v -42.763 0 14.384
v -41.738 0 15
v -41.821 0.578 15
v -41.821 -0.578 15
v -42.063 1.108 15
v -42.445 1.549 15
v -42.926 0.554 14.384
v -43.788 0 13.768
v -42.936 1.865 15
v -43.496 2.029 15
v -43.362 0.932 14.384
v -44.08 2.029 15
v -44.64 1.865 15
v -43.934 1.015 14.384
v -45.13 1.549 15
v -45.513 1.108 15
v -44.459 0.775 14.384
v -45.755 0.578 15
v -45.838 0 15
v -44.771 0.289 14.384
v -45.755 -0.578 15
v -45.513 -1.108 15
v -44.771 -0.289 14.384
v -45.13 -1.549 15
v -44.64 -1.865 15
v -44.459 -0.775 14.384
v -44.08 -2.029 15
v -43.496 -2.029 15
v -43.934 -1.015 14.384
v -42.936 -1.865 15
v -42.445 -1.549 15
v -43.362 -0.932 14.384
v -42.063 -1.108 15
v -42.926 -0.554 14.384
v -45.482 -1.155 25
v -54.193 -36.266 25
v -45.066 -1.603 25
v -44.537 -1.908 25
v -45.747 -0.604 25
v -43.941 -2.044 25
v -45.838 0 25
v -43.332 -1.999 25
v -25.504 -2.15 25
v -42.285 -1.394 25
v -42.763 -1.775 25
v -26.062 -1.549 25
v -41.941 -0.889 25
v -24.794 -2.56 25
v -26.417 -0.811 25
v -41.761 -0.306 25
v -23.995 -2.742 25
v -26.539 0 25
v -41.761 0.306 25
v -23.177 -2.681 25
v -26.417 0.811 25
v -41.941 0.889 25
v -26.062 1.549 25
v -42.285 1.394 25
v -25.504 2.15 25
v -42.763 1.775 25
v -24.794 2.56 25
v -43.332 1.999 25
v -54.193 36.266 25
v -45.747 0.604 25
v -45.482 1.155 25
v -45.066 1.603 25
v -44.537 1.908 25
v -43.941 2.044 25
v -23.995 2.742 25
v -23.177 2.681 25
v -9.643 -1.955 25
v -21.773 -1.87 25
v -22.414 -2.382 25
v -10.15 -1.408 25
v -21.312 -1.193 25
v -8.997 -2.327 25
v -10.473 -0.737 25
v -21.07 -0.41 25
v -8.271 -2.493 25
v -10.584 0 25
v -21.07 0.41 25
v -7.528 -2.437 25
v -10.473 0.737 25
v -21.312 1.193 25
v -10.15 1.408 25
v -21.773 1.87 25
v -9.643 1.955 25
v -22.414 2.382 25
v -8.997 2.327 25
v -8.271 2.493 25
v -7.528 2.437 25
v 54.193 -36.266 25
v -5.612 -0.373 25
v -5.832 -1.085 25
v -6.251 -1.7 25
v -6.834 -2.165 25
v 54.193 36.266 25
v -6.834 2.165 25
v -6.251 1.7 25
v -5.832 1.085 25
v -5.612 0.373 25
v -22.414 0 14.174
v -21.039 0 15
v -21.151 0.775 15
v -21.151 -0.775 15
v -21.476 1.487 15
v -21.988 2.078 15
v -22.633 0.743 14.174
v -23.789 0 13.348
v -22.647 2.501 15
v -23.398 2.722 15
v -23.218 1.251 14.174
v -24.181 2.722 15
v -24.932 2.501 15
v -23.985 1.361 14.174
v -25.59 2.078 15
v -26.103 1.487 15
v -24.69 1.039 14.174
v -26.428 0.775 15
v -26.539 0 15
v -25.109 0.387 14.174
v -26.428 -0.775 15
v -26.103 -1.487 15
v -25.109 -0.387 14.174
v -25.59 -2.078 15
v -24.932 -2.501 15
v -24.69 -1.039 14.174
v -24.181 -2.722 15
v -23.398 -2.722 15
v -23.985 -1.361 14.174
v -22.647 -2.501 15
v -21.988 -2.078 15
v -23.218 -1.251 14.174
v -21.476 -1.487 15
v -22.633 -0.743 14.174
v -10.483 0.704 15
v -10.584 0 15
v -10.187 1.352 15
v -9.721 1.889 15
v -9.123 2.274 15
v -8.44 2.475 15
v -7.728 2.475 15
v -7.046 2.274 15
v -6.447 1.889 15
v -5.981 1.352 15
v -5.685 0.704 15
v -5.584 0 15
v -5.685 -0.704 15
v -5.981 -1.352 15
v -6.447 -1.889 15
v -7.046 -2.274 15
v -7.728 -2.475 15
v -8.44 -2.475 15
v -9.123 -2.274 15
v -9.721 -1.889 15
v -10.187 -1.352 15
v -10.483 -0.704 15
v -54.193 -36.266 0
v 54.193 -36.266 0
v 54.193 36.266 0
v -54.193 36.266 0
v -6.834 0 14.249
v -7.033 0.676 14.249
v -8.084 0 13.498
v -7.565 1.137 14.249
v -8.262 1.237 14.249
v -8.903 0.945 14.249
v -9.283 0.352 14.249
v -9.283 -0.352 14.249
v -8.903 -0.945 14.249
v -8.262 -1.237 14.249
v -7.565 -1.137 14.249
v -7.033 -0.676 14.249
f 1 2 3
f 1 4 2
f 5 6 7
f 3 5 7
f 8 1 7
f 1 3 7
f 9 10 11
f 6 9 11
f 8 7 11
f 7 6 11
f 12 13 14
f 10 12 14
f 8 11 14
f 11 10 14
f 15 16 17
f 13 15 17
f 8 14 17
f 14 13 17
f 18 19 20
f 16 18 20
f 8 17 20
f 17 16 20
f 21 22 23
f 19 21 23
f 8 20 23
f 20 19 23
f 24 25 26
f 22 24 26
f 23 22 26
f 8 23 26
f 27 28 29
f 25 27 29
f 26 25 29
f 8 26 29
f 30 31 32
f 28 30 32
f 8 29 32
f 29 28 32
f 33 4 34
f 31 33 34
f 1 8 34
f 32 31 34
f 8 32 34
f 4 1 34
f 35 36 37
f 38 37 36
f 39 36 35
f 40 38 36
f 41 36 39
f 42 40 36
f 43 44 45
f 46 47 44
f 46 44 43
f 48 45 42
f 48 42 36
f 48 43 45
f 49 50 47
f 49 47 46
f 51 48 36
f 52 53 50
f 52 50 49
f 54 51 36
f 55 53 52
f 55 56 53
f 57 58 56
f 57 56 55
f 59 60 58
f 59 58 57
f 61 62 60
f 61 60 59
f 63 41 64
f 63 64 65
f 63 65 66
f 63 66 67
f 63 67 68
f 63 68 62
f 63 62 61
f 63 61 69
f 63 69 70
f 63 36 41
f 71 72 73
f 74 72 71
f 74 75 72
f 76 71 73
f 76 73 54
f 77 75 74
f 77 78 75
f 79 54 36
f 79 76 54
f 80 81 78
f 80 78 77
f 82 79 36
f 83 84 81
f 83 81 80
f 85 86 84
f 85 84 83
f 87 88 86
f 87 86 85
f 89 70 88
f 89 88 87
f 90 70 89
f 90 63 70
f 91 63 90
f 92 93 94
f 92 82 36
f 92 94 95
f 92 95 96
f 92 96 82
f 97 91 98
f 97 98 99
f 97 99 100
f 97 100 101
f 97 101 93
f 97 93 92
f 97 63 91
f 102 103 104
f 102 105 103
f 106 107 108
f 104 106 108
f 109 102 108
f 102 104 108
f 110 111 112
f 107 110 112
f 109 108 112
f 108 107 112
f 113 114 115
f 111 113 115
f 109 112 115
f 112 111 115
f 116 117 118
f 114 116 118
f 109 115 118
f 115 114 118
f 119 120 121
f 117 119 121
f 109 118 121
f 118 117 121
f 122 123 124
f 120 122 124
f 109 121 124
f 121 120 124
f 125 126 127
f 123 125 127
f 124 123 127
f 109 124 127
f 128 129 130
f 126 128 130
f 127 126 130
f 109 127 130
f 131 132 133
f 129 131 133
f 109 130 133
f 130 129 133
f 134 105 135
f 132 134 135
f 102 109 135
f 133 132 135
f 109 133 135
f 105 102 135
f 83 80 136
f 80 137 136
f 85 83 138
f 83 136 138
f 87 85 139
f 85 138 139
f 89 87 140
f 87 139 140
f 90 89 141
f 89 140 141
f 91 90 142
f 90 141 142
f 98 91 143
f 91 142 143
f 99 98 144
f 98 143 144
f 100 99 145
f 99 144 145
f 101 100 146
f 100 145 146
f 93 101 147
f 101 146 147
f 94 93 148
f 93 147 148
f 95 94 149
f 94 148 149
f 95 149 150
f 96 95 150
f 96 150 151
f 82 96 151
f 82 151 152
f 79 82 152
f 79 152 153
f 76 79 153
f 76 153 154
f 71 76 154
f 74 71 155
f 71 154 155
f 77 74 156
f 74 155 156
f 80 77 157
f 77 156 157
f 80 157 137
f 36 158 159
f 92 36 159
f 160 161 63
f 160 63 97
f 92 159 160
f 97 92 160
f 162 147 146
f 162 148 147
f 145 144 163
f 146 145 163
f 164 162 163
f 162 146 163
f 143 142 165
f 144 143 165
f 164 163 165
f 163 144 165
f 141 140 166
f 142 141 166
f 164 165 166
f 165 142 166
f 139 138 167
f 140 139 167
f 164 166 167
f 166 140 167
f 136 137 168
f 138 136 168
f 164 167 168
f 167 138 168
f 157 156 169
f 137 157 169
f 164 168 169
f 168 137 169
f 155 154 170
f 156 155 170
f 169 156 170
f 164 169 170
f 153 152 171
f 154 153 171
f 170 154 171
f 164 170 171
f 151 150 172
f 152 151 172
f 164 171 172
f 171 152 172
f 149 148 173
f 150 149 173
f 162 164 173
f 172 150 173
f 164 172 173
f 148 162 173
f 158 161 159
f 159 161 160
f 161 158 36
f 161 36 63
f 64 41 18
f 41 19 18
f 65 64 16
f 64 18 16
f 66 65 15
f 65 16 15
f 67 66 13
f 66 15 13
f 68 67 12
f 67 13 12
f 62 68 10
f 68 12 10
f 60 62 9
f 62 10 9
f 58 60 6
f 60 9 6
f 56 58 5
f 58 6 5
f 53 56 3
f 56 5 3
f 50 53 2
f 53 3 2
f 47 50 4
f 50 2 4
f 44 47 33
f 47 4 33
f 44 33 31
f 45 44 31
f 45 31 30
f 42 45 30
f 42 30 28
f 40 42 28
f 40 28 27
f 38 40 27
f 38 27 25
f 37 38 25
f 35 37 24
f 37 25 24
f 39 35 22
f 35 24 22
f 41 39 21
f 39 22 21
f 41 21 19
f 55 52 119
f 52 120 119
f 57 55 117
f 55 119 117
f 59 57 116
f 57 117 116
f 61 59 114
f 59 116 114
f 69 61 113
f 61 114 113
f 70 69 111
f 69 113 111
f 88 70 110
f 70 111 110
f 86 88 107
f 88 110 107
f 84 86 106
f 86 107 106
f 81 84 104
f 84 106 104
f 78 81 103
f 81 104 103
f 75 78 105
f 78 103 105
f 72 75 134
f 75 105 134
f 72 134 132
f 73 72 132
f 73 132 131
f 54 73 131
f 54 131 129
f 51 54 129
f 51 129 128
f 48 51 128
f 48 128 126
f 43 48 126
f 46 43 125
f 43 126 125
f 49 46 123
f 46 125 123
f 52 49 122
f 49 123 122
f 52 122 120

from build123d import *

# Parameters (mm, degrees)
F0_W     = 108.3868816495
F0_H     = 72.5326761603
F1_DEPTH = 25
F3_D     = 4.1
F3_DEPTH = 10
F3_TIP   = 1.231764269
F4_D     = 5.5
F4_DEPTH = 10
F4_TIP   = 1.6523667023
F5_D     = 5
F5_DEPTH = 10
F5_TIP   = 1.5021515476


with BuildPart() as f1:
    # F0 (on Top) → F1 (new body)
    with BuildSketch(Plane.XY):
        Rectangle(F0_W, F0_H)
    extrude(amount=F1_DEPTH)

    # F3
    with Locations(Plane.XY.offset(25)):
        with Locations((-43.7879338861, 0)):
            Hole(F3_D / 2, depth=F3_DEPTH)
            with Locations((0, 0, -(F3_DEPTH + F3_TIP / 2))):  # 118° drill point
                Cone(0, F3_D / 2, F3_TIP, mode=Mode.SUBTRACT)

    # F4
    with Locations(Plane.XY.offset(25)):
        with Locations((-23.7893629819, 0)):
            Hole(F4_D / 2, depth=F4_DEPTH)
            with Locations((0, 0, -(F4_DEPTH + F4_TIP / 2))):  # 118° drill point
                Cone(0, F4_D / 2, F4_TIP, mode=Mode.SUBTRACT)

    # F5
    with Locations(Plane.XY.offset(25)):
        with Locations((-8.0840988085, 0)):
            Hole(F5_D / 2, depth=F5_DEPTH)
            with Locations((0, 0, -(F5_DEPTH + F5_TIP / 2))):  # 118° drill point
                Cone(0, F5_D / 2, F5_TIP, mode=Mode.SUBTRACT)


solid = f1.part
